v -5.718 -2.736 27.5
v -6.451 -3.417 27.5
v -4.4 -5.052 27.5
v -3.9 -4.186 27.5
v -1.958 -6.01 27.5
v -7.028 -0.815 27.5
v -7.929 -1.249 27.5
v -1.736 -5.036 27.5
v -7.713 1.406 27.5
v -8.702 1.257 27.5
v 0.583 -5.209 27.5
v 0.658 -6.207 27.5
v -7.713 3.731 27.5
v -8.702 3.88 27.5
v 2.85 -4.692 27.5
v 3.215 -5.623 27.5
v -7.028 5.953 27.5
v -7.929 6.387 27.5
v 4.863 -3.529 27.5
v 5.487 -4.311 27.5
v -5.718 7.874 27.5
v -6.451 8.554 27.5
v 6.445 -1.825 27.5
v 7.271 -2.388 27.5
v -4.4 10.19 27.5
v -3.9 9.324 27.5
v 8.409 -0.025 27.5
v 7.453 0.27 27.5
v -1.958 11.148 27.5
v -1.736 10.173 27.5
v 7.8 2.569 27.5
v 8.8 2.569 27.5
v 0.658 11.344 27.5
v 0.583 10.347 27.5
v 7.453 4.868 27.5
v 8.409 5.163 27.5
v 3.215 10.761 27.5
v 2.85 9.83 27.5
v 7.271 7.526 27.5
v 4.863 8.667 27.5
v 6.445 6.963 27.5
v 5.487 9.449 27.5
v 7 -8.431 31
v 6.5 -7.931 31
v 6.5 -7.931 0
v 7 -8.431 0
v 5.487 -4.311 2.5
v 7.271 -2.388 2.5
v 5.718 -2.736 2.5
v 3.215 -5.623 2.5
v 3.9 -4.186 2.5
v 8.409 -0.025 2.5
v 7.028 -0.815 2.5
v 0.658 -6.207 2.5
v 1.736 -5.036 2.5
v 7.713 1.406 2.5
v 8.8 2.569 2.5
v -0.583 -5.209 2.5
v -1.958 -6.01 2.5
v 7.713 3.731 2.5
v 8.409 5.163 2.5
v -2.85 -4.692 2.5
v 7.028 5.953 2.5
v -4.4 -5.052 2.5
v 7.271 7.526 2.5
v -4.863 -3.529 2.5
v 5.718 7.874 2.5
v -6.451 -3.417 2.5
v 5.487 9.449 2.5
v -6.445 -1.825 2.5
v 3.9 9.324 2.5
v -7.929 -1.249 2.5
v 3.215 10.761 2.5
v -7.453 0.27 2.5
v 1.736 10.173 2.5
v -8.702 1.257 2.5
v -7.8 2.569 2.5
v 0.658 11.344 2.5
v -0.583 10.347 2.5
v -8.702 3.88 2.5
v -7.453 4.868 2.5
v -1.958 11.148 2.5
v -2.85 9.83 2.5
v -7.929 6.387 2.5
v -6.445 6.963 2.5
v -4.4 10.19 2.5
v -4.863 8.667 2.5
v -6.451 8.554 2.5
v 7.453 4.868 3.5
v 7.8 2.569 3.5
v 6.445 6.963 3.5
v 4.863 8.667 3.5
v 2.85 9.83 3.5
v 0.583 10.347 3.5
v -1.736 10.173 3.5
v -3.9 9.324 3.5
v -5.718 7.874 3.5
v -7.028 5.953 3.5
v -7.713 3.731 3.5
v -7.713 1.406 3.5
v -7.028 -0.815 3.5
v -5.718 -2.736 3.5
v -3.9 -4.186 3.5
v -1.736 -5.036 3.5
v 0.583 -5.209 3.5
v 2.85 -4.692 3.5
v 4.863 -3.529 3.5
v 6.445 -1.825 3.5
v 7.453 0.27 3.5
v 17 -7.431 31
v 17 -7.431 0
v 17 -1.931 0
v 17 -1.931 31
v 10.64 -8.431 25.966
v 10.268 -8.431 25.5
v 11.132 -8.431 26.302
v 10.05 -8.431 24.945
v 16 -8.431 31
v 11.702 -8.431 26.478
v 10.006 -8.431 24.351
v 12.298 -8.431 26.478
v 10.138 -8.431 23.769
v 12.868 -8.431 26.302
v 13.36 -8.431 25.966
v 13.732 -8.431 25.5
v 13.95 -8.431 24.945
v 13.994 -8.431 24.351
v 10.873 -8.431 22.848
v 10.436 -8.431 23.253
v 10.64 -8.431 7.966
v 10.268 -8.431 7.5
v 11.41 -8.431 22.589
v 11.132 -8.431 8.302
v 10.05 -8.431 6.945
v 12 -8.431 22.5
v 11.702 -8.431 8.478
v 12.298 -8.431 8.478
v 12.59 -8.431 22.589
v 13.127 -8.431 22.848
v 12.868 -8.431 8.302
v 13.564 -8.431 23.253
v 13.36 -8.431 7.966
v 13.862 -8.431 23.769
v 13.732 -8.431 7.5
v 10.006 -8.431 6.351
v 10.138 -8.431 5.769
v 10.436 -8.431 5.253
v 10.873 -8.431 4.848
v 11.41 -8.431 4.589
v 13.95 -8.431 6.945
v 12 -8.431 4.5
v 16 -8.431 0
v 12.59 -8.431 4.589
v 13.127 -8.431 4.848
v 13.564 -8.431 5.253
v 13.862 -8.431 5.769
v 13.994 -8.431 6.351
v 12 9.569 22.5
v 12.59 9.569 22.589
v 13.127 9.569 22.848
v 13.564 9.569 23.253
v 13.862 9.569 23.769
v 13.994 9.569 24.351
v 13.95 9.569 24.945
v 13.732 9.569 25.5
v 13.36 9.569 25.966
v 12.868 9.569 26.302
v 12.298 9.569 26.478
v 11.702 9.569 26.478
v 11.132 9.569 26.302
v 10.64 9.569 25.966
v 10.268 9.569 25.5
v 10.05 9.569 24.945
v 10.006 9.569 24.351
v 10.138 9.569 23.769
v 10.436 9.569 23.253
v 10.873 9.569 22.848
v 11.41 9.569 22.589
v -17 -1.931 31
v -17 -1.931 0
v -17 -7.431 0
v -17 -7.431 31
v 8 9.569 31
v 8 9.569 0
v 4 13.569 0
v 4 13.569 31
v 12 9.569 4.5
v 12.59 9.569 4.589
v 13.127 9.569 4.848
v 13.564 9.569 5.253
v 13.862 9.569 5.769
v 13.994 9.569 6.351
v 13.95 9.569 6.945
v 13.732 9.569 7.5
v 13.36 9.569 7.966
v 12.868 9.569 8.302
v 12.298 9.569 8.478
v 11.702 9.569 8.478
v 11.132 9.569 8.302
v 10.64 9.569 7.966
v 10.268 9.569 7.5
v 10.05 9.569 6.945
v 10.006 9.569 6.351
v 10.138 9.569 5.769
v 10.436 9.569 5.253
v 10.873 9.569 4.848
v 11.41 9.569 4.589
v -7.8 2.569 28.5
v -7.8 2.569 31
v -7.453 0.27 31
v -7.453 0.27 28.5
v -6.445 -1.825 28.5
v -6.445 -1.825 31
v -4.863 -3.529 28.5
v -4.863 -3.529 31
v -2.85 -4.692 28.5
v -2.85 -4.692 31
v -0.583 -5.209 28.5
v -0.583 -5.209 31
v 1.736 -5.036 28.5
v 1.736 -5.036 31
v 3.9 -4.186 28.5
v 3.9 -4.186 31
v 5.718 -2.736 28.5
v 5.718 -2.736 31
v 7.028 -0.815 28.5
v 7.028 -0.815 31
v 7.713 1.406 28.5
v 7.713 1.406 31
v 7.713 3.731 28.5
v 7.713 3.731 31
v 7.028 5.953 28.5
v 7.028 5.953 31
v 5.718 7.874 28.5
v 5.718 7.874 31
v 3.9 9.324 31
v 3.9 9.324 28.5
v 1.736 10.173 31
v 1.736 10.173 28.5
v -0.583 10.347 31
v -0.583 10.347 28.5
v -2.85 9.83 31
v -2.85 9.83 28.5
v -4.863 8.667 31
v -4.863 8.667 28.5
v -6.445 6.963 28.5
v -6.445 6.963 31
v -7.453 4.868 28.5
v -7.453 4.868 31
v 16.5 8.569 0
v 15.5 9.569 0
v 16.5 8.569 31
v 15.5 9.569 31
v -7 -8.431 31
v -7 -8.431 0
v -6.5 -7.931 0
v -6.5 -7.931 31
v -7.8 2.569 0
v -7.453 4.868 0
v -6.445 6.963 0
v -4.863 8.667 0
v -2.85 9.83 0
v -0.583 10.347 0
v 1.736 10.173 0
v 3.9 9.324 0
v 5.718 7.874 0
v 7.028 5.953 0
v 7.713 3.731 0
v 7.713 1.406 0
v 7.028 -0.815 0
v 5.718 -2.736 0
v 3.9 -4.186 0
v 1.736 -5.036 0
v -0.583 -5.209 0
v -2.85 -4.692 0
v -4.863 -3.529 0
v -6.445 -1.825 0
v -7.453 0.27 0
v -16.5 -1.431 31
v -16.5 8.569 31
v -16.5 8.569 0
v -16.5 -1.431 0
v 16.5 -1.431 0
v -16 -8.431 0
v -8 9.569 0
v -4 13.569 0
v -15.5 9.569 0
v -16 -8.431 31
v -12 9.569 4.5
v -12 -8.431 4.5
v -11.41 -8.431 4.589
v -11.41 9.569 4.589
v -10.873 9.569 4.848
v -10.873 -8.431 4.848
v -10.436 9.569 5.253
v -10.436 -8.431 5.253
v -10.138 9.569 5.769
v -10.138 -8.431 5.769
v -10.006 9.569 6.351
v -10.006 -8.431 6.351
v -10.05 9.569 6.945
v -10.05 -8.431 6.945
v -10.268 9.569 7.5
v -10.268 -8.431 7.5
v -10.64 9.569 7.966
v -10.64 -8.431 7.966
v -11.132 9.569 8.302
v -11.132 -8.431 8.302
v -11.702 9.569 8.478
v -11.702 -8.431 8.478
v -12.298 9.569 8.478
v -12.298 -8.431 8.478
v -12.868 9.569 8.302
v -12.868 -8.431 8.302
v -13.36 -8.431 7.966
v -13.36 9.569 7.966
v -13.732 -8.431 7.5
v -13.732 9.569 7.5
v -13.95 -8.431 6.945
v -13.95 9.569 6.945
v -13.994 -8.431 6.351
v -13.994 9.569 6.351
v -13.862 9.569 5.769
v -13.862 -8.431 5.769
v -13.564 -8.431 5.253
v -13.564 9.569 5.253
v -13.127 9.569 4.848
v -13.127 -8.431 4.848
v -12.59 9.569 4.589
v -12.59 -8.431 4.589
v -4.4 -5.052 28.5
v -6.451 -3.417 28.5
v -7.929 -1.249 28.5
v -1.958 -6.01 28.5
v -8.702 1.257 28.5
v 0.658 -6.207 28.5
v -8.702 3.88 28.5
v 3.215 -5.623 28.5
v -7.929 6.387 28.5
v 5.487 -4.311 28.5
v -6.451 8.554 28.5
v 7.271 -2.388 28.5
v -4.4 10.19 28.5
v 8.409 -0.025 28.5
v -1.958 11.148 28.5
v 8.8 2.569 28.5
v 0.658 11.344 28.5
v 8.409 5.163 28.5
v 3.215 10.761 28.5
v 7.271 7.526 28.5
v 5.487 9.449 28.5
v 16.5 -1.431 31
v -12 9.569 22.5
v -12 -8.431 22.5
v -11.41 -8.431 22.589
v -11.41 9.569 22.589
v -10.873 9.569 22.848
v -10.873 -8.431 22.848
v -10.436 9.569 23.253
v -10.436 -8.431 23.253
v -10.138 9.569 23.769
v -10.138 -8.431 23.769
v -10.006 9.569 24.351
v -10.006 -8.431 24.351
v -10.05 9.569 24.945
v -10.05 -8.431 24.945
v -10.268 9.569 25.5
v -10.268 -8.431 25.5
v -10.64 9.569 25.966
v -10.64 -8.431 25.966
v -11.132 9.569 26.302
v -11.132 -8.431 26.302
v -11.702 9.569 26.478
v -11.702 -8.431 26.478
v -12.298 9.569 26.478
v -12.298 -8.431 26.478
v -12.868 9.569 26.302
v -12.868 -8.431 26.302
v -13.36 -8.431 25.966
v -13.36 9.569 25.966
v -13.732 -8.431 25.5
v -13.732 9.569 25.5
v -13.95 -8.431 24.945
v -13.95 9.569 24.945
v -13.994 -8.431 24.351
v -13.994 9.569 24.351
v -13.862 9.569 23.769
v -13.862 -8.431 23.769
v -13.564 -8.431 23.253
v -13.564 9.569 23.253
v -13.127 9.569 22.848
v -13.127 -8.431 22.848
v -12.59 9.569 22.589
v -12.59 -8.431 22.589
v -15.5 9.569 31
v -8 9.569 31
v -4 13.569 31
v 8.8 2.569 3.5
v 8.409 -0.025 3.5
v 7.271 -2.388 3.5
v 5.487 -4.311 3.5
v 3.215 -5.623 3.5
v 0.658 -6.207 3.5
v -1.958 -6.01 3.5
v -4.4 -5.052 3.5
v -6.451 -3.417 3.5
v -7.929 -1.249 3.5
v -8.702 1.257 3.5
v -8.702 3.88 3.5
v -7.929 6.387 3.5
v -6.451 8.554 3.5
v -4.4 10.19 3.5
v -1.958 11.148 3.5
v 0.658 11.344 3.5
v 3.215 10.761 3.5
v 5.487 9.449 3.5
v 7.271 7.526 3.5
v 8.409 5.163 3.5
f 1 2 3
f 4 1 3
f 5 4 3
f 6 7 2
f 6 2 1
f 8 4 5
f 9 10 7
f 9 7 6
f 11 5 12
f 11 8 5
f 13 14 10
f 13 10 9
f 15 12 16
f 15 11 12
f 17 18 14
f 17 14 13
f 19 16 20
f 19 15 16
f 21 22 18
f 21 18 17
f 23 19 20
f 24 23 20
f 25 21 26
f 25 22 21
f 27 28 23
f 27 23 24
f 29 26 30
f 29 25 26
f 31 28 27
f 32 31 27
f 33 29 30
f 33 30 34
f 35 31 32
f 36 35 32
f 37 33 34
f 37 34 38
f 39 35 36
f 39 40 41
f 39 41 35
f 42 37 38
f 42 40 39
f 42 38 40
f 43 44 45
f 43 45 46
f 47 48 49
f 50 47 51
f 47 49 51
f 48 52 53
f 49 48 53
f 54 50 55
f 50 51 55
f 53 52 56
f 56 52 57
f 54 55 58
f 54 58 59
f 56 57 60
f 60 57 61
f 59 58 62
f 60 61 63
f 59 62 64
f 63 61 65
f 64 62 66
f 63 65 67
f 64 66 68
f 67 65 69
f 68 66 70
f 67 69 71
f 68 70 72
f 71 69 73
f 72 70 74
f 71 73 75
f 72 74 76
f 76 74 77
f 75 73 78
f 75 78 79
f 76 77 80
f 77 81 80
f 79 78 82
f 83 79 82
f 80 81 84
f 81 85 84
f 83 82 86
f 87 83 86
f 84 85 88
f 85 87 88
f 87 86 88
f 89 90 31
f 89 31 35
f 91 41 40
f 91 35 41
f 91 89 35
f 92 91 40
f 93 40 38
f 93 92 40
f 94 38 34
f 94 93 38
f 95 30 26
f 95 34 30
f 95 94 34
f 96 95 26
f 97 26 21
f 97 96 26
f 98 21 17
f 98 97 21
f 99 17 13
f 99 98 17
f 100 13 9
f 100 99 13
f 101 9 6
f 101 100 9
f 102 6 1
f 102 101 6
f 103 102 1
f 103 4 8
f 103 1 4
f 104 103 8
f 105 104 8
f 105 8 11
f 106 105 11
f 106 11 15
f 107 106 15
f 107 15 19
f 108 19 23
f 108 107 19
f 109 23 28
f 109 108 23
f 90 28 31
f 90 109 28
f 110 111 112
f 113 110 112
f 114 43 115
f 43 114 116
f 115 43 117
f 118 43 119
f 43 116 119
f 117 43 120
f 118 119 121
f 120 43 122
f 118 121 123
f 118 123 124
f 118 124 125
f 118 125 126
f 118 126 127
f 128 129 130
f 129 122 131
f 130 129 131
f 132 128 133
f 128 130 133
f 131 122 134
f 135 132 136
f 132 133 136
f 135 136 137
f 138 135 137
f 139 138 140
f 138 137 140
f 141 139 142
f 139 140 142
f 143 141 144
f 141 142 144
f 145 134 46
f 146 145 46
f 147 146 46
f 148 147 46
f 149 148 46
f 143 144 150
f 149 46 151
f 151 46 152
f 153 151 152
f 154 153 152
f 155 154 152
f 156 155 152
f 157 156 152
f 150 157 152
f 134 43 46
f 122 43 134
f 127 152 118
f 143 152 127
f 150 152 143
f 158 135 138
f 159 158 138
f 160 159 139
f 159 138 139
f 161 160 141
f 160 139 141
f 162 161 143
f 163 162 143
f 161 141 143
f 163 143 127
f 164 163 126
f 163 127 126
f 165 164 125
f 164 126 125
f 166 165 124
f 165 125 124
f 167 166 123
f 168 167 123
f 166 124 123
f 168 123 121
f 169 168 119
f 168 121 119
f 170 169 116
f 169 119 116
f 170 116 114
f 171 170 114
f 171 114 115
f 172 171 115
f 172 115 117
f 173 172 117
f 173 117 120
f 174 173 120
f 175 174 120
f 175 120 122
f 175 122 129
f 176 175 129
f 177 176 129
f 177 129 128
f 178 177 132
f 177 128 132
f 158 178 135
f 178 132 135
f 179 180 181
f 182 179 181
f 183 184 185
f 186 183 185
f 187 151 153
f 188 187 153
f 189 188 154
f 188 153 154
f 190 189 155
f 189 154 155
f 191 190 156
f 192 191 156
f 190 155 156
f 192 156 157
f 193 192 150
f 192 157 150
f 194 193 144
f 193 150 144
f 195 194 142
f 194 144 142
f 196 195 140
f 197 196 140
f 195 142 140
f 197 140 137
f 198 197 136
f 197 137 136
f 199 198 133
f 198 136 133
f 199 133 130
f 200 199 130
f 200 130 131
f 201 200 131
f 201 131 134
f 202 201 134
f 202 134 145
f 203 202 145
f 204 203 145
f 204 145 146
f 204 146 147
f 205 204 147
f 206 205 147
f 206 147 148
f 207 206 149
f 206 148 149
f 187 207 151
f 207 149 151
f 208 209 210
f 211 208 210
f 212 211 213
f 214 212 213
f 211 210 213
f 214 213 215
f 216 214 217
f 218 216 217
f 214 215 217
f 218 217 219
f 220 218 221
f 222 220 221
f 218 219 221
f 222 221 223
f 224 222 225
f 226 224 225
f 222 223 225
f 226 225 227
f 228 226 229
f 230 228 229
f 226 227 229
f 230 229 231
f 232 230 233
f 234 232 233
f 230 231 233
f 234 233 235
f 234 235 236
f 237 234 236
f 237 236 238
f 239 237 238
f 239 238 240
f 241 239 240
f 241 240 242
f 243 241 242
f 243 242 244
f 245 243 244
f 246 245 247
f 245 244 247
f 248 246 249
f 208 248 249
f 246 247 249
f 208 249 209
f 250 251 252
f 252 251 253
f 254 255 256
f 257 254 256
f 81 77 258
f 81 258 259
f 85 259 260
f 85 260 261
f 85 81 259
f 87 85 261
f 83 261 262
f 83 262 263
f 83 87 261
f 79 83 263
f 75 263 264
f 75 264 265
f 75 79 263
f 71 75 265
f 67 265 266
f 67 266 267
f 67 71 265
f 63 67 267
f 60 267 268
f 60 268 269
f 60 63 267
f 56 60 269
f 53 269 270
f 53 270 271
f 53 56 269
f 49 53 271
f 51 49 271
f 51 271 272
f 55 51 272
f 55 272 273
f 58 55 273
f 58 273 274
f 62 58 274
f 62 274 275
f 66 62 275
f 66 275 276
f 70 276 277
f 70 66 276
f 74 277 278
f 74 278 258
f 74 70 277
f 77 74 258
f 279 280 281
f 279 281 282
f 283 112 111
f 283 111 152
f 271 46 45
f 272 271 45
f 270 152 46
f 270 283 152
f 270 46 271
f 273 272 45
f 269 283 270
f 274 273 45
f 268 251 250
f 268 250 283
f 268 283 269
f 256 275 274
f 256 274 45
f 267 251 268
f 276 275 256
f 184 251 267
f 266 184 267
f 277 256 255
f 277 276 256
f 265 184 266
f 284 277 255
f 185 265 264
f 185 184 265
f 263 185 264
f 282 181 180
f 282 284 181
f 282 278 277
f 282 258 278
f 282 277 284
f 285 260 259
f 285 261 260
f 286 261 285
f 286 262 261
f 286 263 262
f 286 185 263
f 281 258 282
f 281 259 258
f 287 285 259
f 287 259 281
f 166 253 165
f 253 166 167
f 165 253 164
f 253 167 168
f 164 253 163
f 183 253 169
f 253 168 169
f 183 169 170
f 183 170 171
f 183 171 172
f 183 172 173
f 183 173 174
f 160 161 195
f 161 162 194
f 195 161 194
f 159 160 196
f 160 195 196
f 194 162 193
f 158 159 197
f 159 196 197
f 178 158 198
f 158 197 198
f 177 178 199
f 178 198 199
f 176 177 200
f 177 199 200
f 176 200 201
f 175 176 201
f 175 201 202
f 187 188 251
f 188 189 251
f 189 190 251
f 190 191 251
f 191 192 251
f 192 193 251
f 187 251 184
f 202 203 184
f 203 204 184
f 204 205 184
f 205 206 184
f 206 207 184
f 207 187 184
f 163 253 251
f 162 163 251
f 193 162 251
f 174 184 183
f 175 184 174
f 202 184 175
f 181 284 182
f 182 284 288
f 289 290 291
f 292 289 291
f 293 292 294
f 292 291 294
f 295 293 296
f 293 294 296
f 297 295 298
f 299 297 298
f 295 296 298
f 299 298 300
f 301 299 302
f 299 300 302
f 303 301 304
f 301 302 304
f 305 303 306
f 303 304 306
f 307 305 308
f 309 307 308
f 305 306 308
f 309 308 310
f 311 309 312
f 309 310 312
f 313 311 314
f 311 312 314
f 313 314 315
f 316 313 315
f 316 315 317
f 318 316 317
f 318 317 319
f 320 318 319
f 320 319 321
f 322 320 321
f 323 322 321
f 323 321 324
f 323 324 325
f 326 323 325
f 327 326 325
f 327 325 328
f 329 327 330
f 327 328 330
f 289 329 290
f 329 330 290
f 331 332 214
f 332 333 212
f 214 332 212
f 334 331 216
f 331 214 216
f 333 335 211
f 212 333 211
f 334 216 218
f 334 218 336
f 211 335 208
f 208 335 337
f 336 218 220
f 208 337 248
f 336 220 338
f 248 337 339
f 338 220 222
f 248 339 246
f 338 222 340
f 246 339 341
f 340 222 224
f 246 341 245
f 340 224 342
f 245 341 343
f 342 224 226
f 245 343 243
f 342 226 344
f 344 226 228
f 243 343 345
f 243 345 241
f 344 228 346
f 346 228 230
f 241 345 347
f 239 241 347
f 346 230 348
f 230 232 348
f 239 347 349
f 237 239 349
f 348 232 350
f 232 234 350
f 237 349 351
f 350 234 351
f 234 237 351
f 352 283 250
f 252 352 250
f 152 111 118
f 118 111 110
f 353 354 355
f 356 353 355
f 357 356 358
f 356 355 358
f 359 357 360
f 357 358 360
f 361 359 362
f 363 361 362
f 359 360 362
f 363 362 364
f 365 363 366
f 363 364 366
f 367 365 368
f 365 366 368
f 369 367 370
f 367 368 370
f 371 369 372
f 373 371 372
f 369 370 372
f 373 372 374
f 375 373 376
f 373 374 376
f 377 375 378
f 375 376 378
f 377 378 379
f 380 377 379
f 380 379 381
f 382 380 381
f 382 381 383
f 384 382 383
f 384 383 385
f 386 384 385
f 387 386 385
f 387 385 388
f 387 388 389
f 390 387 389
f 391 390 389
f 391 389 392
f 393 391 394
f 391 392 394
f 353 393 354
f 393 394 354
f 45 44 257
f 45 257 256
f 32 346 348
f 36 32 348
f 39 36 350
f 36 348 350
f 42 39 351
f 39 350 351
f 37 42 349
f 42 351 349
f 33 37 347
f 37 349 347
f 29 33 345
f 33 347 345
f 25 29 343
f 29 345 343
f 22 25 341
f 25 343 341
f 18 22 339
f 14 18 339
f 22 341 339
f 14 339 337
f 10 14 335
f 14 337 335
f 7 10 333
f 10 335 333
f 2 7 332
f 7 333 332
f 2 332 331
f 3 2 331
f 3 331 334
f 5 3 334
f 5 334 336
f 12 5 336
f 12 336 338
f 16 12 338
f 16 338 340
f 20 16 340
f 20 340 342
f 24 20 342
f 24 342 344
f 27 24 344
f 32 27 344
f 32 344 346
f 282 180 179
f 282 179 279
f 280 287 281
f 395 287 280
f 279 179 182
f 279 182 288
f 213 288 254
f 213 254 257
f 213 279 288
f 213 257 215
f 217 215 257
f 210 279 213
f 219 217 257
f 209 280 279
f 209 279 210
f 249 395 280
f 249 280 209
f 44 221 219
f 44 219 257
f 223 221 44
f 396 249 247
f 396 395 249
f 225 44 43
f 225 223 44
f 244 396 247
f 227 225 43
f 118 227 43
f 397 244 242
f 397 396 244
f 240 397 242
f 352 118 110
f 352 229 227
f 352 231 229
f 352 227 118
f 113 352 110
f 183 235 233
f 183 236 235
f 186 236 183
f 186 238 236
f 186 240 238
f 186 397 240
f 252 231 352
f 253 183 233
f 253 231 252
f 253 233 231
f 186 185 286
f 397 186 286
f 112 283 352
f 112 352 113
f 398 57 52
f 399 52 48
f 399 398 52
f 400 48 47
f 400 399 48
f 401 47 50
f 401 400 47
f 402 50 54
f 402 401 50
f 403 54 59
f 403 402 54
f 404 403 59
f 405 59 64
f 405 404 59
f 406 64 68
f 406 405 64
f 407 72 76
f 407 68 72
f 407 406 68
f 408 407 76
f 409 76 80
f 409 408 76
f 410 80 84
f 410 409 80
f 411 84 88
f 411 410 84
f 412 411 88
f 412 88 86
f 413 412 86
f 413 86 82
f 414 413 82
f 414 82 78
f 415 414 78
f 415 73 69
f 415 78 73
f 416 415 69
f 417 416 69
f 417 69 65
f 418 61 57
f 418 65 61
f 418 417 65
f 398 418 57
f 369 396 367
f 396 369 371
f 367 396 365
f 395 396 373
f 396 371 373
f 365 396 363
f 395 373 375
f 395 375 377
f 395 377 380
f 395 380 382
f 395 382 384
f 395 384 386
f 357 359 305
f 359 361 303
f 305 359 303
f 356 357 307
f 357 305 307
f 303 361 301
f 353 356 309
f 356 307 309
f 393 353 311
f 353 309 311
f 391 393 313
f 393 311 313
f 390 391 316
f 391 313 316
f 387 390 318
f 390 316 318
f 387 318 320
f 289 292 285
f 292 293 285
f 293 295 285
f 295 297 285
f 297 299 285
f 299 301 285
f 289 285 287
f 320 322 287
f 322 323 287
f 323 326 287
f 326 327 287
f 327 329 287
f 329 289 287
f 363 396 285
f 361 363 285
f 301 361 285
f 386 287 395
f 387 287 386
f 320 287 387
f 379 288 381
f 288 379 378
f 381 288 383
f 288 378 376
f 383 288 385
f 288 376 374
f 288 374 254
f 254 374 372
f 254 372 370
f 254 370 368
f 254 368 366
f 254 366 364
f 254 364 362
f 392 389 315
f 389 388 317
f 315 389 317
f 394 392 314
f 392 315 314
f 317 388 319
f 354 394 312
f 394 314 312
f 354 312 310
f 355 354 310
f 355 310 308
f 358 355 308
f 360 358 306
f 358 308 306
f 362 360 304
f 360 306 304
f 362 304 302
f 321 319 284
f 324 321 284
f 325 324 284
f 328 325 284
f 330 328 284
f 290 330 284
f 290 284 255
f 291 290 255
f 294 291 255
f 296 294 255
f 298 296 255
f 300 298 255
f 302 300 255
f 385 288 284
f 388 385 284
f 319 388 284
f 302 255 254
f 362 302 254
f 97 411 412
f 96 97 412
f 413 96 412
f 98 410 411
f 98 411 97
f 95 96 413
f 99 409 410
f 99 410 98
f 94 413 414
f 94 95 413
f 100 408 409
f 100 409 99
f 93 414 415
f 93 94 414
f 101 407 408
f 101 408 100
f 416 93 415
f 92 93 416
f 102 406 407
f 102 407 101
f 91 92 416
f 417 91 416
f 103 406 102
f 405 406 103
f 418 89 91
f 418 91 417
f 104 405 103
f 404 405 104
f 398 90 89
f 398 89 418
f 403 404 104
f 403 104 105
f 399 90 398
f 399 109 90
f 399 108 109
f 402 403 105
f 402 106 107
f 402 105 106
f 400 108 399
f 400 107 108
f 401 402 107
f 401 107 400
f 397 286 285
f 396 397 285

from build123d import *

# Parameters (mm, degrees)
SKETCH1_R           = 7.8
BOSS_EXTRUDE1_DEPTH = 31
CHAMFER1_SIZE       = 1
CHAMFER2_SIZE       = 1
CHAMFER3_SIZE       = 1
CHAMFER4_SIZE       = 1
SKETCH2_R           = 2
CUT_EXTRUDE1_DEPTH  = 18
SKETCH3_R           = 8.8
CUT_EXTRUDE2_DEPTH  = 3.5
CUT_EXTRUDE3_START  = -3.5
SKETCH4_R           = 8.8
CUT_EXTRUDE3_DEPTH  = 3.5
BOSS_EXTRUDE2_START = -2.5
SKETCH5_R           = 8.8
SKETCH5_R_2         = 7.8
BOSS_EXTRUDE2_DEPTH = 2.5
SKETCH6_R           = 8.8
SKETCH6_R_2         = 7.8
BOSS_EXTRUDE3_DEPTH = 2.5


with BuildPart() as part:
    # Sketch1 → Boss-Extrude1 (new body)
    with BuildSketch(Plane.XY):
        Polygon((-6, -7.931107296), (6, -7.931107296), (6, -8.431107296), (17, -8.431107296), (17, -0.931107296), (16.5, -0.931107296), (16.5, 9.568892704), (8, 9.568892704), (4, 13.568892704), (-4, 13.568892704), (-8, 9.568892704), (-16.5, 9.568892704), (-16.5, -0.931107296), (-17, -0.931107296), (-17, -8.431107296), (-6, -8.431107296), align=None)
        with Locations((0, 2.568892704)):
            Circle(SKETCH1_R, mode=Mode.SUBTRACT)
    extrude(amount=BOSS_EXTRUDE1_DEPTH)

    # Chamfer1
    chamfer1_edges = [part.edges().sort_by_distance(p)[0] for p in [
        (-16.5, 9.568892704, 15.5),
        (16.5, 9.568892704, 15.5),
    ]]
    chamfer(chamfer1_edges, length=CHAMFER1_SIZE)

    # Chamfer2
    # the kernel refuses this chamfer: 1 mm, written as the material it takes off along each edge
    with BuildSketch(Plane(origin=(-17, -0.931107296, -2.571682988), x_dir=(-0.02749587661058563, -0.9996219169112968, 0), z_dir=(0, 0, 1))) as chamfer2_piece_1_section:
        Polygon((CHAMFER2_SIZE * 0.999621916911, CHAMFER2_SIZE * 0.0274958766106), (-CHAMFER2_SIZE * 0.0274958766106, CHAMFER2_SIZE * 0.999621916911), (0, 0), align=None)
    chamfer2_piece_1 = extrude(amount=36.143365976, mode=Mode.PRIVATE)
    chamfer2_piece_1 = split(chamfer2_piece_1, bisect_by=Plane(origin=(-16.5, -1.32450838, 15.5), z_dir=(-1, 0, 0)), keep=Keep.TOP, mode=Mode.PRIVATE)
    add(chamfer2_piece_1, mode=Mode.SUBTRACT)
    with BuildSketch(Plane(origin=(17, -0.931107296, -2.571682988), x_dir=(-0.9996219169112968, 0.027495876610586403, 0), z_dir=(0, 0, 1))) as chamfer2_piece_2_section:
        Polygon((CHAMFER2_SIZE * 0.999621916911, CHAMFER2_SIZE * 0.0274958766106), (-CHAMFER2_SIZE * 0.0274958766106, CHAMFER2_SIZE * 0.999621916911), (0, 0), align=None)
    chamfer2_piece_2 = extrude(amount=36.143365976, mode=Mode.PRIVATE)
    chamfer2_piece_2 = split(chamfer2_piece_2, bisect_by=Plane(origin=(16.5, -1.32450838, 15.5), z_dir=(1, 0, 0)), keep=Keep.TOP, mode=Mode.PRIVATE)
    add(chamfer2_piece_2, mode=Mode.SUBTRACT)

    # Chamfer3
    chamfer3_edges = [part.edges().sort_by_distance(p)[0] for p in [
        (-17, -8.431107296, 15.5),
        (17, -8.431107296, 15.5),
    ]]
    chamfer(chamfer3_edges, length=CHAMFER3_SIZE)

    # Chamfer4
    # the kernel refuses this chamfer: 1 mm, written as the material it takes off along each edge
    with BuildSketch(Plane(origin=(-6, -8.431107296, -2.571682988), x_dir=(-0.9996219169112968, -0.027495876610585623, 0), z_dir=(0, 0, 1))) as chamfer4_piece_1_section:
        Polygon((CHAMFER4_SIZE * 0.999621916911, -CHAMFER4_SIZE * 0.0274958766106), (-CHAMFER4_SIZE * 0.0274958766106, -CHAMFER4_SIZE * 0.999621916911), (0, 0), align=None)
    chamfer4_piece_1 = extrude(amount=36.143365976, mode=Mode.PRIVATE)
    chamfer4_piece_1 = split(chamfer4_piece_1, bisect_by=Plane(origin=(-6.393401084, -7.931107296, 15.5), z_dir=(0, -1, 0)), keep=Keep.TOP, mode=Mode.PRIVATE)
    add(chamfer4_piece_1, mode=Mode.SUBTRACT)
    with BuildSketch(Plane(origin=(6, -8.431107296, -2.571682988), x_dir=(-0.027495876610586487, 0.9996219169112968, 0), z_dir=(0, 0, 1))) as chamfer4_piece_2_section:
        Polygon((CHAMFER4_SIZE * 0.999621916911, -CHAMFER4_SIZE * 0.0274958766106), (-CHAMFER4_SIZE * 0.0274958766106, -CHAMFER4_SIZE * 0.999621916911), (0, 0), align=None)
    chamfer4_piece_2 = extrude(amount=36.143365976, mode=Mode.PRIVATE)
    chamfer4_piece_2 = split(chamfer4_piece_2, bisect_by=Plane(origin=(6.393401084, -7.931107296, 15.5), z_dir=(0, -1, 0)), keep=Keep.TOP, mode=Mode.PRIVATE)
    add(chamfer4_piece_2, mode=Mode.SUBTRACT)

    # Sketch2 → Cut-Extrude1 (cut)
    with BuildSketch(Plane.XZ.offset(8.431107296)):
        with Locations(Location((-12, 6.5, 0), (0, 0, 270))):
            Circle(SKETCH2_R)
        with Locations(Location((-12, 24.5, 0), (0, 0, 270))):
            Circle(SKETCH2_R)
        with Locations(Location((12, 6.5, 0), (0, 0, 270))):
            Circle(SKETCH2_R)
        with Locations(Location((12, 24.5, 0), (0, 0, 270))):
            Circle(SKETCH2_R)
    extrude(amount=-CUT_EXTRUDE1_DEPTH, mode=Mode.SUBTRACT)

    # Sketch3 → Cut-Extrude2 (cut)
    with BuildSketch(Plane.XY.offset(31)):
        with Locations((0, 2.568892704)):
            Circle(SKETCH3_R)
    extrude(amount=-CUT_EXTRUDE2_DEPTH, mode=Mode.SUBTRACT)

    # Sketch4 → Cut-Extrude3 (cut)
    with BuildSketch(Plane(origin=(0, 0, 0), x_dir=(-1, 0, 0), z_dir=(0, 0, -1)).offset(CUT_EXTRUDE3_START)):
        with Locations(Location((0, 2.568892704, 0), (0, 0, 180))):
            Circle(SKETCH4_R)
    extrude(amount=CUT_EXTRUDE3_DEPTH, mode=Mode.SUBTRACT)

    # Sketch5 → Boss-Extrude2 (add)
    with BuildSketch(Plane(origin=(0, 0, 0), x_dir=(-1, 0, 0), z_dir=(0, 0, -1)).offset(BOSS_EXTRUDE2_START)):
        with Locations((0, 2.568892704)):
            Circle(SKETCH5_R)
        with Locations((0, 2.568892704)):
            Circle(SKETCH5_R_2, mode=Mode.SUBTRACT)
    extrude(amount=BOSS_EXTRUDE2_DEPTH)

    # Sketch6 → Boss-Extrude3 (add)
    with BuildSketch(Plane.XY.offset(31)):
        with Locations((0, 2.568892704)):
            Circle(SKETCH6_R)
        with Locations(Location((0, 2.568892704, 0), (0, 0, 180))):
            Circle(SKETCH6_R_2, mode=Mode.SUBTRACT)
    extrude(amount=-BOSS_EXTRUDE3_DEPTH)


solid = part.part
